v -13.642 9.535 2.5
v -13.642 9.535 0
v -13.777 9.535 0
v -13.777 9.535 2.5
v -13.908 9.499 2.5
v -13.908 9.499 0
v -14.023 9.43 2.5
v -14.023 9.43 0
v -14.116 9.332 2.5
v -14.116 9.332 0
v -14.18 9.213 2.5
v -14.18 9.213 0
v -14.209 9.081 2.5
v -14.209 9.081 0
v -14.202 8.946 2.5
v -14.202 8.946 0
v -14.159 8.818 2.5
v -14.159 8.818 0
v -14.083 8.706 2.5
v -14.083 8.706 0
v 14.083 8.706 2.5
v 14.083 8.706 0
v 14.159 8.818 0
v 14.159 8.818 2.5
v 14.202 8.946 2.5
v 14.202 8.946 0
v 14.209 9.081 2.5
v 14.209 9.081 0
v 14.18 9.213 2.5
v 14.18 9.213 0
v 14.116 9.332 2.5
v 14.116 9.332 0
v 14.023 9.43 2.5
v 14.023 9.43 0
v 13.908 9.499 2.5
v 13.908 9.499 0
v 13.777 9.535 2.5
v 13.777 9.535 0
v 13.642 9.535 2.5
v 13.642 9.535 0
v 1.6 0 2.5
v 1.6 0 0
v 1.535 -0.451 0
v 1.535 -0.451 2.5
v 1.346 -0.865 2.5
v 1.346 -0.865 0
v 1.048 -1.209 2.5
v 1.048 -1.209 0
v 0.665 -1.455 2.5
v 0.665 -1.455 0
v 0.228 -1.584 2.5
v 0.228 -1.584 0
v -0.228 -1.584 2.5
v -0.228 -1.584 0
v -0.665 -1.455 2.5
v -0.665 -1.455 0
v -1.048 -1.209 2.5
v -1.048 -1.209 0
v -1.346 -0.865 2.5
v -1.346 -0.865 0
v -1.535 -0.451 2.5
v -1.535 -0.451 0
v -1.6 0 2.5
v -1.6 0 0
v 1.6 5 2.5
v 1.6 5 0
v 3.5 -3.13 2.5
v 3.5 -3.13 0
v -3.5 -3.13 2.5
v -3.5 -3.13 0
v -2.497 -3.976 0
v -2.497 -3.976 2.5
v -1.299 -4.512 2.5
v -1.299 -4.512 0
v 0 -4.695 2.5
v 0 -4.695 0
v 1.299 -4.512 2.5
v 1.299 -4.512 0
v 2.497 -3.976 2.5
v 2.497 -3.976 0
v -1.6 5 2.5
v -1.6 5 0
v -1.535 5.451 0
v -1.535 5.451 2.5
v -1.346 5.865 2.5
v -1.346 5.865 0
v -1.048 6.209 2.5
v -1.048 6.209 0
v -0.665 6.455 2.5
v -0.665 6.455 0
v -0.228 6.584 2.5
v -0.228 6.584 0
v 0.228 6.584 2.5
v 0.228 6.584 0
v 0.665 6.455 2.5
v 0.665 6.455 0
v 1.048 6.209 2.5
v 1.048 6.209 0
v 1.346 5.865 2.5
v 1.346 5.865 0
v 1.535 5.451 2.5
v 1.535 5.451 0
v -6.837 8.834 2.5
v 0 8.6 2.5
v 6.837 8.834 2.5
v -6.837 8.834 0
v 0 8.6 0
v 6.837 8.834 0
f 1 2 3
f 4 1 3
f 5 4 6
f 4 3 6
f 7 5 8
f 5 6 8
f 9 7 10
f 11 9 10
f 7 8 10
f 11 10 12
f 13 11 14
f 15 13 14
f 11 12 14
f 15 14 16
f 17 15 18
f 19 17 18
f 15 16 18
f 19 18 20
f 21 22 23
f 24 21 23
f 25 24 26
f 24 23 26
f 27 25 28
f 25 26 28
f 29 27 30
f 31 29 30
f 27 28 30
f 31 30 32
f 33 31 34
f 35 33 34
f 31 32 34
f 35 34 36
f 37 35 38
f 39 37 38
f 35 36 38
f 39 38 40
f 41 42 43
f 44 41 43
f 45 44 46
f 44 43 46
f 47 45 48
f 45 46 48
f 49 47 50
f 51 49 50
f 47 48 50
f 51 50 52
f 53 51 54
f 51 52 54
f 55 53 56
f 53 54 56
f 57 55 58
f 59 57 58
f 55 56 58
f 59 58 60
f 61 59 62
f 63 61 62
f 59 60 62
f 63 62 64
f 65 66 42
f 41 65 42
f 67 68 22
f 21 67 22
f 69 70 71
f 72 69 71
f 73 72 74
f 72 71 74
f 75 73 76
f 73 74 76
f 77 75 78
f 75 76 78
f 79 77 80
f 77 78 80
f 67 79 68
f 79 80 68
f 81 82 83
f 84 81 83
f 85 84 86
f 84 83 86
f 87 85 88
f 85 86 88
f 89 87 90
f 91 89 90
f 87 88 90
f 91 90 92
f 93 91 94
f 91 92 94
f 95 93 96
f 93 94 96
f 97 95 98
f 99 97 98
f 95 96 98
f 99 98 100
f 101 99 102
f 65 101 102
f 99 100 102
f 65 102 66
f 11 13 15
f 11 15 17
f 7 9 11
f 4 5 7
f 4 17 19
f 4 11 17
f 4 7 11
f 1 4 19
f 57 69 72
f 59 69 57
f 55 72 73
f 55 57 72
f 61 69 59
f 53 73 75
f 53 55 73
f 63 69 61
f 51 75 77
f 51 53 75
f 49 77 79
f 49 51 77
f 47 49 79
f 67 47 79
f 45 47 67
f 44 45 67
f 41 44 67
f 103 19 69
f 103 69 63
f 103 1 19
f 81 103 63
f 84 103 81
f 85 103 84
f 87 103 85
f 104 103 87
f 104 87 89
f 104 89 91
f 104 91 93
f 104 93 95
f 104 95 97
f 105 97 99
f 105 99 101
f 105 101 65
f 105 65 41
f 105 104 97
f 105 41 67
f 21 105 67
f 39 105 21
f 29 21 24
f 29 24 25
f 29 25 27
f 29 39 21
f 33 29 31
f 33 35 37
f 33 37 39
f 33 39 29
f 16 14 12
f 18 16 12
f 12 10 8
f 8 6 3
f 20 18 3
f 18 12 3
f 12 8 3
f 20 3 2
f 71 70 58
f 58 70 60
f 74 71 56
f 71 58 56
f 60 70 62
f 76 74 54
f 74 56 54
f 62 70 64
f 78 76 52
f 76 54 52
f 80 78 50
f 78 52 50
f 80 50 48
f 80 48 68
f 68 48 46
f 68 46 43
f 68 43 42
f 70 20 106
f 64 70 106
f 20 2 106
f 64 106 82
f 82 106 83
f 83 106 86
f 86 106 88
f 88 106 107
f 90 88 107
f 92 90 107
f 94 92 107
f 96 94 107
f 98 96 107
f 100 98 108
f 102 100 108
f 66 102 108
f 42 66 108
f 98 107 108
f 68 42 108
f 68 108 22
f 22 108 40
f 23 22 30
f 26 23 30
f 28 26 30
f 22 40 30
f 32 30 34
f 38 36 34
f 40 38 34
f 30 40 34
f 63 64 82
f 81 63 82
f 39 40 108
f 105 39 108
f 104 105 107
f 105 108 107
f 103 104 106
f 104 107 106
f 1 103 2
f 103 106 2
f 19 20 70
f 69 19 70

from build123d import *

# Parameters (mm, degrees)
F1_DEPTH = 2.5


with BuildPart() as f1:
    # F0 (on Top) → F1 (new body)
    with BuildSketch(Plane.XY):
        with BuildLine():
            ThreePointArc((13.64249, 9.534957), (0, 8.599999), (-13.64249, 9.534957))
            ThreePointArc((-13.64249, 9.534957), (-14.152097, 9.274517), (-14.083427, 8.706351))
            Line((-14.083427, 8.706351), (-3.5, -3.129614))
            ThreePointArc((-3.5, -3.129614), (0, -4.695155), (3.5, -3.129614))
            Line((3.5, -3.129614), (14.083427, 8.706351))
            ThreePointArc((14.083427, 8.706351), (14.152097, 9.274517), (13.64249, 9.534957))
        make_face()
        with BuildLine():
            ThreePointArc((-1.6, 5), (1e-06, 6.599999), (1.6, 4.999999))
            Line((1.6, 4.999999), (1.6, -1e-06))
            ThreePointArc((1.6, -1e-06), (-1e-06, -1.6), (-1.6, 0))
            Line((-1.6, 0), (-1.6, 5))
        make_face(mode=Mode.SUBTRACT)
    extrude(amount=F1_DEPTH)


solid = f1.part
